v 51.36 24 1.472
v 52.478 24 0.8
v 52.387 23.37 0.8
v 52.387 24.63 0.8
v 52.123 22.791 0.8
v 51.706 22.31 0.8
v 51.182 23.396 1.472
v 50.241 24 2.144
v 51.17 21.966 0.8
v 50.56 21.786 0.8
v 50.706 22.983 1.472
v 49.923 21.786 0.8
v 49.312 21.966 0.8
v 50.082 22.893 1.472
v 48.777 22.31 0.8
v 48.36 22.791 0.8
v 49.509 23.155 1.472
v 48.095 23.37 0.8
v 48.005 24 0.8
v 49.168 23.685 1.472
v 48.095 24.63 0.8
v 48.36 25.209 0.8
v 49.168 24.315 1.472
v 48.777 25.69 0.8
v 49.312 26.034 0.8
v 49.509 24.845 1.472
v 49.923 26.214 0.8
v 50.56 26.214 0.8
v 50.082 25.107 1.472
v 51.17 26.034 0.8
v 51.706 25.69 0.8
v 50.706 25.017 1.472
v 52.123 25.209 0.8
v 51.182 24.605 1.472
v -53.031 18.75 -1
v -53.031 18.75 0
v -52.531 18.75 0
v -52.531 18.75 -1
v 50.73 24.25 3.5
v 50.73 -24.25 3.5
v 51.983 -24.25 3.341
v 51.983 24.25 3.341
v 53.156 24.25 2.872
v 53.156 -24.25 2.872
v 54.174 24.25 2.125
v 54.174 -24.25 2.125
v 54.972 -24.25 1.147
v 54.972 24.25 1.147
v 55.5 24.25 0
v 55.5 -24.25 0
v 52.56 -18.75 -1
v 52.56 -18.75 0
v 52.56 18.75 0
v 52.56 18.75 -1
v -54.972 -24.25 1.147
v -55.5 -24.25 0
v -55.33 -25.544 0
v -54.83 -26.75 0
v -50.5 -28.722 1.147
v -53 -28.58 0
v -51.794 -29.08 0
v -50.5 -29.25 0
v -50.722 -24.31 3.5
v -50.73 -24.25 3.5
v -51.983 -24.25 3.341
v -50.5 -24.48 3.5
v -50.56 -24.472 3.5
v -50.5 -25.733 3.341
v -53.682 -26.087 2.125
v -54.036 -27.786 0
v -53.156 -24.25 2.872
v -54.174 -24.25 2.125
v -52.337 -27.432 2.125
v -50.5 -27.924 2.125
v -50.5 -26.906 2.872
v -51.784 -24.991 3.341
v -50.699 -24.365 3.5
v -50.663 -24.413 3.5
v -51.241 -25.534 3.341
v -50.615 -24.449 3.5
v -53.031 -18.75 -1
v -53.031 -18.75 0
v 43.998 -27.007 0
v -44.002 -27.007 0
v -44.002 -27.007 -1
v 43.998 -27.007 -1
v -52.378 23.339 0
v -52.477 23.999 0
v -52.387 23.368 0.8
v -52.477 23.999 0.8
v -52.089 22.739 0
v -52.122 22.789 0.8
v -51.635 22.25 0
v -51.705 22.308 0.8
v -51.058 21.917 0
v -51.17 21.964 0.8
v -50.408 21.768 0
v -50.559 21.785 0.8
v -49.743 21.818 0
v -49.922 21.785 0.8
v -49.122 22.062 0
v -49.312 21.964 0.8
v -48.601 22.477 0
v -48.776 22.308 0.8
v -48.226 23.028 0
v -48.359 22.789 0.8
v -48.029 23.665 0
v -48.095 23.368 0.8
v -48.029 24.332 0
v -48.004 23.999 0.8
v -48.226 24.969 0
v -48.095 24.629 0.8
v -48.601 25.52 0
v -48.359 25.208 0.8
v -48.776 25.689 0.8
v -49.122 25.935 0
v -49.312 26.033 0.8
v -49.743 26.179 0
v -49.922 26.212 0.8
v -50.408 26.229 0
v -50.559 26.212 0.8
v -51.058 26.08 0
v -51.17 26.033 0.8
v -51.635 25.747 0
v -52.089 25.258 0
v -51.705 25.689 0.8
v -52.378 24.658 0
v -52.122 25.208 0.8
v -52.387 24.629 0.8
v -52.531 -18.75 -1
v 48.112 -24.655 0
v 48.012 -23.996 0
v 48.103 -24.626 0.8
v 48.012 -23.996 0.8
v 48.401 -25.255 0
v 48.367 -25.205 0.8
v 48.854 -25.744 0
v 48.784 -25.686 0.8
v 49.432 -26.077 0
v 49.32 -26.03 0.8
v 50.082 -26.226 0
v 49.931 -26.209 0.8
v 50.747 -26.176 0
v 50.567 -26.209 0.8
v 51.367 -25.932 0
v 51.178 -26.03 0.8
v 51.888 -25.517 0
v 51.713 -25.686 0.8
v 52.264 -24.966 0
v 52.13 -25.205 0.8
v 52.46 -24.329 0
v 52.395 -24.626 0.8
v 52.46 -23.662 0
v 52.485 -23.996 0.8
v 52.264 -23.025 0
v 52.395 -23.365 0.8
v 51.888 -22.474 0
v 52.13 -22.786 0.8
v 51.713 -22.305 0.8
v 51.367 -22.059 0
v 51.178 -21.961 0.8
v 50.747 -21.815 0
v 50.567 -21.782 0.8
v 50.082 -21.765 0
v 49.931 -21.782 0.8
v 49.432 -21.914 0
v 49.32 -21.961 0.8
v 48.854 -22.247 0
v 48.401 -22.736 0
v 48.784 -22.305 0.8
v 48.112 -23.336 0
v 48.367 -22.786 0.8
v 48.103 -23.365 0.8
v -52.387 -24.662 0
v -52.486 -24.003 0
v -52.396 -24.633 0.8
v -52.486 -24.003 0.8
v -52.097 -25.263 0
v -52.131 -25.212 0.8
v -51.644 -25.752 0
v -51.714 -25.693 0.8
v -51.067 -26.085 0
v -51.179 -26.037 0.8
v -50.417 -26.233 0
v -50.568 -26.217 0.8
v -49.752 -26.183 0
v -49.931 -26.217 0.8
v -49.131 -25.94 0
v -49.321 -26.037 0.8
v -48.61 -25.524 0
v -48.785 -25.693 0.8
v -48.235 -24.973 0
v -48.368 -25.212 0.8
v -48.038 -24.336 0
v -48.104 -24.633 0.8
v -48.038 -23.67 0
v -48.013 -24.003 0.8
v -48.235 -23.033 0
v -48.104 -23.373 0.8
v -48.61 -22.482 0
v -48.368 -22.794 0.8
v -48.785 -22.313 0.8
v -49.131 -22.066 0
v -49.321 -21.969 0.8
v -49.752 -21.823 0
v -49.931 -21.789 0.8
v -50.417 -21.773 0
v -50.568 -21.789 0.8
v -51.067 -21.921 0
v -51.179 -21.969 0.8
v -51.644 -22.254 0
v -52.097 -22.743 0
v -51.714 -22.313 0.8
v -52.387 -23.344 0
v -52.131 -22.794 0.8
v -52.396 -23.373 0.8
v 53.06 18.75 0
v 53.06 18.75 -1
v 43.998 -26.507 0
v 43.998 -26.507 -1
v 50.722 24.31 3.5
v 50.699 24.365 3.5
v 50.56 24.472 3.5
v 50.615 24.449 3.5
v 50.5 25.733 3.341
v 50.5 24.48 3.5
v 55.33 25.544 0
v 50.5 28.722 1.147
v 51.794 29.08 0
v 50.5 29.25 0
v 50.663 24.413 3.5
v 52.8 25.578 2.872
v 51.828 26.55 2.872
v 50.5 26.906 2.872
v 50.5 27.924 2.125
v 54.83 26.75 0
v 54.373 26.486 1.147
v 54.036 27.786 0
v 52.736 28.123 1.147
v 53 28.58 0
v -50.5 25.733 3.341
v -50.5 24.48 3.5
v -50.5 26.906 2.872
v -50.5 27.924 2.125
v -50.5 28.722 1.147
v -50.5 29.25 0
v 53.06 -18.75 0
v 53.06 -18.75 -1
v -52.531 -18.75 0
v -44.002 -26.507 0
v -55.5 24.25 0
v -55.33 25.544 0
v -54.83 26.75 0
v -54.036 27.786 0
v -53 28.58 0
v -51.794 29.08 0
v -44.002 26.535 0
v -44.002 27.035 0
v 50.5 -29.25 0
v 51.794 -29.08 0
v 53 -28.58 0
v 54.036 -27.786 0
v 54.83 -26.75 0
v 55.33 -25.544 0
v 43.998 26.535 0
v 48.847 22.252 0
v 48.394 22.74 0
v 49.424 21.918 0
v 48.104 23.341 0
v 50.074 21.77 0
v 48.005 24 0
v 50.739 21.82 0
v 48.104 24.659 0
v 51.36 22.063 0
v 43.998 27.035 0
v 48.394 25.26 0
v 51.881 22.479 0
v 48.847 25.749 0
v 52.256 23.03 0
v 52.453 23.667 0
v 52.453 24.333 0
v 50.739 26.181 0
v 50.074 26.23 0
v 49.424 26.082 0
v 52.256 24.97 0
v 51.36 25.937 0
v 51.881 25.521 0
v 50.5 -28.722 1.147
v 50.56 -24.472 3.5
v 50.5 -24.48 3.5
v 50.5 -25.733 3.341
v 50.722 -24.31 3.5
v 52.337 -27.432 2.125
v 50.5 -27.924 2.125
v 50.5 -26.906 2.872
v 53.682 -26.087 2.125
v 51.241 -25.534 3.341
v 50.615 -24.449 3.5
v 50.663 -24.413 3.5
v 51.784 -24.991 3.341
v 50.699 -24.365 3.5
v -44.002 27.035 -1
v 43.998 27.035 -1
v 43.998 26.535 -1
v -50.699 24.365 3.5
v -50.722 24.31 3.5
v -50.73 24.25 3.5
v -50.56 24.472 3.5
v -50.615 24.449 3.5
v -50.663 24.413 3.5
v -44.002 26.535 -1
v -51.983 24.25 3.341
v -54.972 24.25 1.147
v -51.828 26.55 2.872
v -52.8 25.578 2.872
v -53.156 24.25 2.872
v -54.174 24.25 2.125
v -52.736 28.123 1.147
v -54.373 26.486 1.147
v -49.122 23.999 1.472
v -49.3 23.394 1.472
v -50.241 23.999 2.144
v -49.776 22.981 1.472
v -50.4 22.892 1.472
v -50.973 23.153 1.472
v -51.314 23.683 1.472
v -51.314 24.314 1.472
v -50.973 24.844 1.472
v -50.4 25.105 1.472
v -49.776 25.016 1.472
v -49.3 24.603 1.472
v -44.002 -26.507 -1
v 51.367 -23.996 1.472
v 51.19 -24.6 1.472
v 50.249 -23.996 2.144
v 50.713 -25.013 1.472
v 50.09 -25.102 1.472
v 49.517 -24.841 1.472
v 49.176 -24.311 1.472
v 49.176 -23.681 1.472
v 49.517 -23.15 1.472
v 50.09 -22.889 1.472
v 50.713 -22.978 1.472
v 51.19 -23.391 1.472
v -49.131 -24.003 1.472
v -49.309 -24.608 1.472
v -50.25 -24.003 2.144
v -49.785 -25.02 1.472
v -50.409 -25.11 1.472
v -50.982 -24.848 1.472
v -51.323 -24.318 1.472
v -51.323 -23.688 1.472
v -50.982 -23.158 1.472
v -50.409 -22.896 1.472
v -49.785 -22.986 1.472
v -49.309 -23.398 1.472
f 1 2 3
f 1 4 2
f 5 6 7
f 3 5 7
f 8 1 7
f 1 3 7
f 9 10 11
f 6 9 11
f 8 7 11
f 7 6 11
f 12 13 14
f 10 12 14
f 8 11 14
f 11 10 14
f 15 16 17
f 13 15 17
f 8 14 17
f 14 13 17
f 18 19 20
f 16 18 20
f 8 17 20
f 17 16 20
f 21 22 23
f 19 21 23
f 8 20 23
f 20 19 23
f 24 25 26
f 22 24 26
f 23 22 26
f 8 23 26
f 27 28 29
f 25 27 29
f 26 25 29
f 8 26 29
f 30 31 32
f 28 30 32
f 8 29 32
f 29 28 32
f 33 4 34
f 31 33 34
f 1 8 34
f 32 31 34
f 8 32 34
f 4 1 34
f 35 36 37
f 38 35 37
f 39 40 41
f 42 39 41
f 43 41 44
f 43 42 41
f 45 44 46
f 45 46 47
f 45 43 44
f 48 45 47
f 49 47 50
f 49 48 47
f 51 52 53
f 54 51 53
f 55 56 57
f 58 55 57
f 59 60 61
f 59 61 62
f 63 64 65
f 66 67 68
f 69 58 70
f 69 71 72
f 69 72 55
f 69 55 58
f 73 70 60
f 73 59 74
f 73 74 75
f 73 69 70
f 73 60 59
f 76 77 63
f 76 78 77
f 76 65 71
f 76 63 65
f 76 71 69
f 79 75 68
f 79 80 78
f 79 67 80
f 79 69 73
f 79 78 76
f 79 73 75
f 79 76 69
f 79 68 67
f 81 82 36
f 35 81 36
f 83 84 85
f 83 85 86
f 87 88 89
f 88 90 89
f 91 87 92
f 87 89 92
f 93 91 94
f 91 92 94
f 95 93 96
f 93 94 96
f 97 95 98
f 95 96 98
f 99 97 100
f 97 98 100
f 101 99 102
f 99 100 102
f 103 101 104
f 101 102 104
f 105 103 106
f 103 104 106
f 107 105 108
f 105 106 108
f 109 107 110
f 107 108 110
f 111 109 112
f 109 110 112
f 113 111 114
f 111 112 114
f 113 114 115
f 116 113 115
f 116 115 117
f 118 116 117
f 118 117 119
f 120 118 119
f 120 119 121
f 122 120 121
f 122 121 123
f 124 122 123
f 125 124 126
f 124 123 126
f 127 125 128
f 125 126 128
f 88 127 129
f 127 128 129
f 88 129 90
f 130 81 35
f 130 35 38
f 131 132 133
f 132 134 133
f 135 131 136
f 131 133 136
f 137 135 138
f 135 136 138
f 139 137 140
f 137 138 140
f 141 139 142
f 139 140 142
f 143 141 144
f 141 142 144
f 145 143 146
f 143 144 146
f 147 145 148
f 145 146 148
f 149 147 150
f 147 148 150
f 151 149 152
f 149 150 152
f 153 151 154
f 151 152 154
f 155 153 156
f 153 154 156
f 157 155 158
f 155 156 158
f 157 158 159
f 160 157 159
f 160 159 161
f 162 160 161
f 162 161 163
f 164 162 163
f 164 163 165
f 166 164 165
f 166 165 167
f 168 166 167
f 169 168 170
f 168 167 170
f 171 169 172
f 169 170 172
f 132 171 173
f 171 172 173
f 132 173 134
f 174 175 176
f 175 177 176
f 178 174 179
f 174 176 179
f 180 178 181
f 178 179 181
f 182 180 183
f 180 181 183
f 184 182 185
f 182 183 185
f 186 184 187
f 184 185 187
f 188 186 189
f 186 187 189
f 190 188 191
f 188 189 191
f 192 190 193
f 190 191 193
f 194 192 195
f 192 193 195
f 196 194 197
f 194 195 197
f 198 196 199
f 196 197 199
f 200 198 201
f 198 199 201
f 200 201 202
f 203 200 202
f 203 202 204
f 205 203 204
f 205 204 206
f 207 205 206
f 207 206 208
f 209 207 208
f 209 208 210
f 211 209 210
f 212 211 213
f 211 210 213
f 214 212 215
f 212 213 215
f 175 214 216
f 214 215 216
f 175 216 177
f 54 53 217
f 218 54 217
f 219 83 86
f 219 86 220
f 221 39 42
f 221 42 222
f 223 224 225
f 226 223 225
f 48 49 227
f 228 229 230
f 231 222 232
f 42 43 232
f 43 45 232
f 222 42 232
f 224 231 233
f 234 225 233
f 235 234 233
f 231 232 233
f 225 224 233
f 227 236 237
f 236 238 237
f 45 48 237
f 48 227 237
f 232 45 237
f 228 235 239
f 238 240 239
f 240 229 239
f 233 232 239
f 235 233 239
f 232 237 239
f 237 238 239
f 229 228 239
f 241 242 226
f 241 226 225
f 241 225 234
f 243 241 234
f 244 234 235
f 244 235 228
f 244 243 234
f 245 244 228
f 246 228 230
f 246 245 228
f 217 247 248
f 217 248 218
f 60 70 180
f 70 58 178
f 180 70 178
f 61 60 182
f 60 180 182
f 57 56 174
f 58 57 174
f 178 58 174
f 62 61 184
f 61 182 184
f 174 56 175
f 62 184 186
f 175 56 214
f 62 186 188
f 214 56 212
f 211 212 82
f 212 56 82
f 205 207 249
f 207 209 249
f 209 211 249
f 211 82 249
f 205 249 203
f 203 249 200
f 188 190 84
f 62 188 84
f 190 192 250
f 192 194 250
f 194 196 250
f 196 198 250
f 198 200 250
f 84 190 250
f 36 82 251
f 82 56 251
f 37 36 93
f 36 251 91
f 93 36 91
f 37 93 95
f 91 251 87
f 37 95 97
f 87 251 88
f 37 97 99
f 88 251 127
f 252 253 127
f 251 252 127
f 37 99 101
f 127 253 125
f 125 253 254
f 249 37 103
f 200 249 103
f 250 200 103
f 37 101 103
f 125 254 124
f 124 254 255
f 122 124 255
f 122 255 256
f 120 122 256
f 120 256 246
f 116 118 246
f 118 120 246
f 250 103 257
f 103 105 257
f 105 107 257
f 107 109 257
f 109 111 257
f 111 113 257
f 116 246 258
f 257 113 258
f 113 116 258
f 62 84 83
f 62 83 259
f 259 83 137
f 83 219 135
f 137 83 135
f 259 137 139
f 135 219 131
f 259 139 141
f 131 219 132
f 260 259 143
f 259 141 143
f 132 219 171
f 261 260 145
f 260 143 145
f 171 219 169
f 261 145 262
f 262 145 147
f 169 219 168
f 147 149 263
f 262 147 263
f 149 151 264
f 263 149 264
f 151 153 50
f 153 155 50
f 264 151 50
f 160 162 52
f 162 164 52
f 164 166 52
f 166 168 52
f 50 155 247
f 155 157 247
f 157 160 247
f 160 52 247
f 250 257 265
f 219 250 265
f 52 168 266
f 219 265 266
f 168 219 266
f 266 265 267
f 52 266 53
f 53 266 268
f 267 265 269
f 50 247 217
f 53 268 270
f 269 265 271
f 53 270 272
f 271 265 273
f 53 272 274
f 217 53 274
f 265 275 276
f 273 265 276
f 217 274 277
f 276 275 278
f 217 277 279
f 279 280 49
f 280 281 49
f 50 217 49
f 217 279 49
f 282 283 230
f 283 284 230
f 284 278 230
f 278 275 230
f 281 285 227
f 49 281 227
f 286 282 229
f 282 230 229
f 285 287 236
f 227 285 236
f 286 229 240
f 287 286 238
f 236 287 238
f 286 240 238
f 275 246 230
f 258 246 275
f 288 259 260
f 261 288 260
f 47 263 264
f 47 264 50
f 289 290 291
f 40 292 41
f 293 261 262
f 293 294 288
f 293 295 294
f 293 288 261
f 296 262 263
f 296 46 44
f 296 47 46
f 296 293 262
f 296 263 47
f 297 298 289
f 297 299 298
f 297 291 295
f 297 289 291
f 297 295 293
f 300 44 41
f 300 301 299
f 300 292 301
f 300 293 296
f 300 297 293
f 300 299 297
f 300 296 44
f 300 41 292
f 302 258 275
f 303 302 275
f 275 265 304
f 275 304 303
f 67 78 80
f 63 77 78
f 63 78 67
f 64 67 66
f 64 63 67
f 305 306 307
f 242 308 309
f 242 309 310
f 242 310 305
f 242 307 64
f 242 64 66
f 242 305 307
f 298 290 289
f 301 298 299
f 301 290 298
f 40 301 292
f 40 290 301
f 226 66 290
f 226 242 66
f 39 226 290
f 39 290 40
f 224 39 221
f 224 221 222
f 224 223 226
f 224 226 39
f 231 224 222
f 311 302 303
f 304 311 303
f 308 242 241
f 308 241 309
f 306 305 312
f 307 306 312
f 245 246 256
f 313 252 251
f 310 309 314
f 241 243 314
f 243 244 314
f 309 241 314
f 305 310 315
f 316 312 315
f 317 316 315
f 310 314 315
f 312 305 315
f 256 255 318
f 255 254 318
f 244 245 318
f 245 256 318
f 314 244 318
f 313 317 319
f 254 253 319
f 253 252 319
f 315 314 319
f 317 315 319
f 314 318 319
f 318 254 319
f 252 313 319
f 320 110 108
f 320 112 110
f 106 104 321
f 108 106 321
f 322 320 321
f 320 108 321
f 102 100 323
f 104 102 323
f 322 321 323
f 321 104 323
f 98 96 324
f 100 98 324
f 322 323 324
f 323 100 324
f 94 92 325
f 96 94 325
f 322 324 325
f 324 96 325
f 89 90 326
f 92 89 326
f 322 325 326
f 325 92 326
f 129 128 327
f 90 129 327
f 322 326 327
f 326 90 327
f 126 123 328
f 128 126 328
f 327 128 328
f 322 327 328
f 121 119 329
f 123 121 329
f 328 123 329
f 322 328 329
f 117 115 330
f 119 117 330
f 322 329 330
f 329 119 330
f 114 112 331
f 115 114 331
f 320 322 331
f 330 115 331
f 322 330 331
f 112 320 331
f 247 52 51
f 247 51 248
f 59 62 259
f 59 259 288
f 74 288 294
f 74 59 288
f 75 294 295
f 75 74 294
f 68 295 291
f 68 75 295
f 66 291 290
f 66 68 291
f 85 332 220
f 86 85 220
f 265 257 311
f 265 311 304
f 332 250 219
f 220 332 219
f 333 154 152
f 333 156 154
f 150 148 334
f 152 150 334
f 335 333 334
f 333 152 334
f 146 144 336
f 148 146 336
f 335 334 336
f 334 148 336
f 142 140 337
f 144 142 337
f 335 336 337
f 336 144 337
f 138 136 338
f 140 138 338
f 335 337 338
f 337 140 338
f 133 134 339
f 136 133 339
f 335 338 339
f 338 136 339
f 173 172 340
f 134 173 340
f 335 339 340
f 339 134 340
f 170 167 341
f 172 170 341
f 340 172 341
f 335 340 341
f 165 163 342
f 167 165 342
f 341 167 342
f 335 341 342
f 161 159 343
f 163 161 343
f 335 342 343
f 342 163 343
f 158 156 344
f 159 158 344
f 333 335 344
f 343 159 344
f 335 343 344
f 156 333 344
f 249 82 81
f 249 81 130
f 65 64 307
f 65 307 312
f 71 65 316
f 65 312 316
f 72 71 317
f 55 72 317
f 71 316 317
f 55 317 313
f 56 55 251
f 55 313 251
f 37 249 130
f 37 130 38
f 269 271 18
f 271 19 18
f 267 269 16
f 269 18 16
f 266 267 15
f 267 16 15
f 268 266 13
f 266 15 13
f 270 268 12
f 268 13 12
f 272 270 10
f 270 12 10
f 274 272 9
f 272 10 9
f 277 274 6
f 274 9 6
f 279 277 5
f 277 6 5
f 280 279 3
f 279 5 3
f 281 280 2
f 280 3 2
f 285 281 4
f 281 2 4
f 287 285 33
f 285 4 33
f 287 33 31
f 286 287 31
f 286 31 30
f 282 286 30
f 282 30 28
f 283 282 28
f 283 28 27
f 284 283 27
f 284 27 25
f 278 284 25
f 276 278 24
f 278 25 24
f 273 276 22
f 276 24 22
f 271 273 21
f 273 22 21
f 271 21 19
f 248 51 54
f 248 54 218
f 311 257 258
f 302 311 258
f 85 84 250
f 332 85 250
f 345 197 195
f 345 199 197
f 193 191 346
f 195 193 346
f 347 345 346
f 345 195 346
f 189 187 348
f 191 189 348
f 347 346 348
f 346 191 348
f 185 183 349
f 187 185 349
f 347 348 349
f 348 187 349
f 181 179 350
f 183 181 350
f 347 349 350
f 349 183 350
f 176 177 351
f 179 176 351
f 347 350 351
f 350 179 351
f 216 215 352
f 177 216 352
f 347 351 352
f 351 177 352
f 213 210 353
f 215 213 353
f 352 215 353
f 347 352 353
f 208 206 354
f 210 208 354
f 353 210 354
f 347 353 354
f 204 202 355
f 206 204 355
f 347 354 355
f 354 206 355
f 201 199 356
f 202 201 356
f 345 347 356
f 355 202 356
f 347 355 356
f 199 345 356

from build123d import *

# Parameters (mm, degrees)
F1_DEPTH     = 3.5
F5_D         = 4.473
F5_DEPTH     = 0.8
F5_TIP       = 1.3438247745
F6_T1_DEPTH  = 101
F6_T3_DEPTH  = 48.5
F6_T6_ANGLE  = 90
F6_T8_ANGLE  = 90
F6_T10_ANGLE = 90
F6_T12_ANGLE = 90
F8_W         = 0.5
F8_H         = 37.5
F8_W_2       = 88
F8_H_2       = 0.5
F9_DEPTH     = 1


# Not quite as in the source:
# - a fillet or chamfer that OpenCascade refuses, or shapes differently, is made with other operations: its cross-section is extruded or revolved along the edge and cut away or added


with BuildPart() as f1:
    # F0 (on Top) → F1 (new body)
    with BuildSketch(Plane.XY):
        with BuildLine():
            Line((-50.5, -29.25), (50.5, -29.25))
            ThreePointArc((50.5, -29.25), (54.0355339059, -27.7855339059), (55.5, -24.25))
            Line((55.5, -24.25), (55.5, 24.25))
            ThreePointArc((55.5, 24.25), (54.0355339059, 27.7855339059), (50.5, 29.25))
            Line((50.5, 29.25), (-50.5, 29.25))
            ThreePointArc((-50.5, 29.25), (-54.0355339059, 27.7855339059), (-55.5, 24.25))
            Line((-55.5, 24.25), (-55.5, -24.25))
            ThreePointArc((-55.5, -24.25), (-54.0355339059, -27.7855339059), (-50.5, -29.25))
        make_face()
    extrude(amount=F1_DEPTH)

    # F5
    with Locations(Plane(origin=(0, 0, 0), x_dir=(1, 0, 0), z_dir=(0, 0, -1))):
        with Locations((-50.2406740561, -23.9985361695), (-50.2495961264, 24.0030474961), (50.2488752827, 23.995583877), (50.2413948998, -24.0000952035)):
            Hole(F5_D / 2, depth=F5_DEPTH)
            with Locations((0, 0, -(F5_DEPTH + F5_TIP / 2))):  # 118° drill point
                Cone(0, F5_D / 2, F5_TIP, mode=Mode.SUBTRACT)

    # F6: fillet of radius 5 on 1 edges, made by hand

    # F6_s2 → F6_t1 (cut)
    with BuildSketch(Plane.YZ.offset(-50.5)):
        with BuildLine():
            ThreePointArc((-29.25, 0), (-27.4383438845, 2.5311288741), (-24.4803039929, 3.5))
            Line((-24.4803039929, 3.5), (-29.25, 3.5))
            Line((-29.25, 3.5), (-29.25, 0))
        make_face()
        with BuildLine():
            ThreePointArc((24.4803039929, 3.5), (27.4383438845, 2.5311288741), (29.25, 0))
            Line((29.25, 0), (29.25, 3.5))
            Line((29.25, 3.5), (24.4803039929, 3.5))
        make_face()
    extrude(amount=F6_T1_DEPTH, mode=Mode.SUBTRACT)

    # F6_s4 → F6_t3 (cut)
    with BuildSketch(Plane.XZ.offset(-24.25)):
        with BuildLine():
            ThreePointArc((50.7303039929, 3.5), (53.6883438845, 2.5311288741), (55.5, 0))
            Line((55.5, 0), (55.5, 3.5))
            Line((55.5, 3.5), (50.7303039929, 3.5))
        make_face()
        with BuildLine():
            ThreePointArc((-50.7303039929, 3.5), (-53.6883438845, 2.5311288741), (-55.5, 0))
            Line((-55.5, 0), (-55.5, 3.5))
            Line((-55.5, 3.5), (-50.7303039929, 3.5))
        make_face()
    extrude(amount=F6_T3_DEPTH, mode=Mode.SUBTRACT)

    # F6_s5 → F6_t6 (revolve, cut)
    with BuildSketch(Plane.XZ.offset(24.25)):
        with BuildLine():
            ThreePointArc((-55.5, 0), (-53.6883438845, 2.5311288741), (-50.7303039929, 3.5))
            Line((-50.7303039929, 3.5), (-55.5, 3.5))
            Line((-55.5, 3.5), (-55.5, 0))
        make_face()
    revolve(axis=Axis((-50.5, -24.25, 3.5), (0, 0, 1)), revolution_arc=F6_T6_ANGLE, mode=Mode.SUBTRACT)

    # F6_s7 → F6_t8 (revolve, cut)
    with BuildSketch(Plane.YZ.offset(50.5)):
        with BuildLine():
            ThreePointArc((-29.25, 0), (-27.4383438845, 2.5311288741), (-24.4803039929, 3.5))
            Line((-24.4803039929, 3.5), (-29.25, 3.5))
            Line((-29.25, 3.5), (-29.25, 0))
        make_face()
    revolve(axis=Axis((50.5, -24.25, 3.5), (0, 0, 1)), revolution_arc=F6_T8_ANGLE, mode=Mode.SUBTRACT)

    # F6_s9 → F6_t10 (revolve, cut)
    with BuildSketch(Plane.XZ.offset(-24.25)):
        with BuildLine():
            ThreePointArc((50.7303039929, 3.5), (53.6883438845, 2.5311288741), (55.5, 0))
            Line((55.5, 0), (55.5, 3.5))
            Line((55.5, 3.5), (50.7303039929, 3.5))
        make_face()
    revolve(axis=Axis((50.5, 24.25, 3.5), (0, 0, 1)), revolution_arc=F6_T10_ANGLE, mode=Mode.SUBTRACT)

    # F6_s11 → F6_t12 (revolve, cut)
    with BuildSketch(Plane.YZ.offset(-50.5)):
        with BuildLine():
            ThreePointArc((24.4803039929, 3.5), (27.4383438845, 2.5311288741), (29.25, 0))
            Line((29.25, 0), (29.25, 3.5))
            Line((29.25, 3.5), (24.4803039929, 3.5))
        make_face()
    revolve(axis=Axis((-50.5, 24.25, 3.5), (0, 0, 1)), revolution_arc=F6_T12_ANGLE, mode=Mode.SUBTRACT)

    # F8 (on Top) → F9 (join)
    with BuildSketch(Plane.XY):
        with Locations((-52.7812354267, 0)):
            Rectangle(F8_W, F8_H)
        with Locations((-0.0016481951, -26.7570052035)):
            Rectangle(F8_W_2, F8_H_2)
        with Locations((52.8098009527, 0)):
            Rectangle(F8_W, F8_H)
        with Locations((-0.0016481951, 26.78494009)):
            Rectangle(F8_W_2, F8_H_2)
    extrude(amount=-F9_DEPTH)


solid = f1.part
